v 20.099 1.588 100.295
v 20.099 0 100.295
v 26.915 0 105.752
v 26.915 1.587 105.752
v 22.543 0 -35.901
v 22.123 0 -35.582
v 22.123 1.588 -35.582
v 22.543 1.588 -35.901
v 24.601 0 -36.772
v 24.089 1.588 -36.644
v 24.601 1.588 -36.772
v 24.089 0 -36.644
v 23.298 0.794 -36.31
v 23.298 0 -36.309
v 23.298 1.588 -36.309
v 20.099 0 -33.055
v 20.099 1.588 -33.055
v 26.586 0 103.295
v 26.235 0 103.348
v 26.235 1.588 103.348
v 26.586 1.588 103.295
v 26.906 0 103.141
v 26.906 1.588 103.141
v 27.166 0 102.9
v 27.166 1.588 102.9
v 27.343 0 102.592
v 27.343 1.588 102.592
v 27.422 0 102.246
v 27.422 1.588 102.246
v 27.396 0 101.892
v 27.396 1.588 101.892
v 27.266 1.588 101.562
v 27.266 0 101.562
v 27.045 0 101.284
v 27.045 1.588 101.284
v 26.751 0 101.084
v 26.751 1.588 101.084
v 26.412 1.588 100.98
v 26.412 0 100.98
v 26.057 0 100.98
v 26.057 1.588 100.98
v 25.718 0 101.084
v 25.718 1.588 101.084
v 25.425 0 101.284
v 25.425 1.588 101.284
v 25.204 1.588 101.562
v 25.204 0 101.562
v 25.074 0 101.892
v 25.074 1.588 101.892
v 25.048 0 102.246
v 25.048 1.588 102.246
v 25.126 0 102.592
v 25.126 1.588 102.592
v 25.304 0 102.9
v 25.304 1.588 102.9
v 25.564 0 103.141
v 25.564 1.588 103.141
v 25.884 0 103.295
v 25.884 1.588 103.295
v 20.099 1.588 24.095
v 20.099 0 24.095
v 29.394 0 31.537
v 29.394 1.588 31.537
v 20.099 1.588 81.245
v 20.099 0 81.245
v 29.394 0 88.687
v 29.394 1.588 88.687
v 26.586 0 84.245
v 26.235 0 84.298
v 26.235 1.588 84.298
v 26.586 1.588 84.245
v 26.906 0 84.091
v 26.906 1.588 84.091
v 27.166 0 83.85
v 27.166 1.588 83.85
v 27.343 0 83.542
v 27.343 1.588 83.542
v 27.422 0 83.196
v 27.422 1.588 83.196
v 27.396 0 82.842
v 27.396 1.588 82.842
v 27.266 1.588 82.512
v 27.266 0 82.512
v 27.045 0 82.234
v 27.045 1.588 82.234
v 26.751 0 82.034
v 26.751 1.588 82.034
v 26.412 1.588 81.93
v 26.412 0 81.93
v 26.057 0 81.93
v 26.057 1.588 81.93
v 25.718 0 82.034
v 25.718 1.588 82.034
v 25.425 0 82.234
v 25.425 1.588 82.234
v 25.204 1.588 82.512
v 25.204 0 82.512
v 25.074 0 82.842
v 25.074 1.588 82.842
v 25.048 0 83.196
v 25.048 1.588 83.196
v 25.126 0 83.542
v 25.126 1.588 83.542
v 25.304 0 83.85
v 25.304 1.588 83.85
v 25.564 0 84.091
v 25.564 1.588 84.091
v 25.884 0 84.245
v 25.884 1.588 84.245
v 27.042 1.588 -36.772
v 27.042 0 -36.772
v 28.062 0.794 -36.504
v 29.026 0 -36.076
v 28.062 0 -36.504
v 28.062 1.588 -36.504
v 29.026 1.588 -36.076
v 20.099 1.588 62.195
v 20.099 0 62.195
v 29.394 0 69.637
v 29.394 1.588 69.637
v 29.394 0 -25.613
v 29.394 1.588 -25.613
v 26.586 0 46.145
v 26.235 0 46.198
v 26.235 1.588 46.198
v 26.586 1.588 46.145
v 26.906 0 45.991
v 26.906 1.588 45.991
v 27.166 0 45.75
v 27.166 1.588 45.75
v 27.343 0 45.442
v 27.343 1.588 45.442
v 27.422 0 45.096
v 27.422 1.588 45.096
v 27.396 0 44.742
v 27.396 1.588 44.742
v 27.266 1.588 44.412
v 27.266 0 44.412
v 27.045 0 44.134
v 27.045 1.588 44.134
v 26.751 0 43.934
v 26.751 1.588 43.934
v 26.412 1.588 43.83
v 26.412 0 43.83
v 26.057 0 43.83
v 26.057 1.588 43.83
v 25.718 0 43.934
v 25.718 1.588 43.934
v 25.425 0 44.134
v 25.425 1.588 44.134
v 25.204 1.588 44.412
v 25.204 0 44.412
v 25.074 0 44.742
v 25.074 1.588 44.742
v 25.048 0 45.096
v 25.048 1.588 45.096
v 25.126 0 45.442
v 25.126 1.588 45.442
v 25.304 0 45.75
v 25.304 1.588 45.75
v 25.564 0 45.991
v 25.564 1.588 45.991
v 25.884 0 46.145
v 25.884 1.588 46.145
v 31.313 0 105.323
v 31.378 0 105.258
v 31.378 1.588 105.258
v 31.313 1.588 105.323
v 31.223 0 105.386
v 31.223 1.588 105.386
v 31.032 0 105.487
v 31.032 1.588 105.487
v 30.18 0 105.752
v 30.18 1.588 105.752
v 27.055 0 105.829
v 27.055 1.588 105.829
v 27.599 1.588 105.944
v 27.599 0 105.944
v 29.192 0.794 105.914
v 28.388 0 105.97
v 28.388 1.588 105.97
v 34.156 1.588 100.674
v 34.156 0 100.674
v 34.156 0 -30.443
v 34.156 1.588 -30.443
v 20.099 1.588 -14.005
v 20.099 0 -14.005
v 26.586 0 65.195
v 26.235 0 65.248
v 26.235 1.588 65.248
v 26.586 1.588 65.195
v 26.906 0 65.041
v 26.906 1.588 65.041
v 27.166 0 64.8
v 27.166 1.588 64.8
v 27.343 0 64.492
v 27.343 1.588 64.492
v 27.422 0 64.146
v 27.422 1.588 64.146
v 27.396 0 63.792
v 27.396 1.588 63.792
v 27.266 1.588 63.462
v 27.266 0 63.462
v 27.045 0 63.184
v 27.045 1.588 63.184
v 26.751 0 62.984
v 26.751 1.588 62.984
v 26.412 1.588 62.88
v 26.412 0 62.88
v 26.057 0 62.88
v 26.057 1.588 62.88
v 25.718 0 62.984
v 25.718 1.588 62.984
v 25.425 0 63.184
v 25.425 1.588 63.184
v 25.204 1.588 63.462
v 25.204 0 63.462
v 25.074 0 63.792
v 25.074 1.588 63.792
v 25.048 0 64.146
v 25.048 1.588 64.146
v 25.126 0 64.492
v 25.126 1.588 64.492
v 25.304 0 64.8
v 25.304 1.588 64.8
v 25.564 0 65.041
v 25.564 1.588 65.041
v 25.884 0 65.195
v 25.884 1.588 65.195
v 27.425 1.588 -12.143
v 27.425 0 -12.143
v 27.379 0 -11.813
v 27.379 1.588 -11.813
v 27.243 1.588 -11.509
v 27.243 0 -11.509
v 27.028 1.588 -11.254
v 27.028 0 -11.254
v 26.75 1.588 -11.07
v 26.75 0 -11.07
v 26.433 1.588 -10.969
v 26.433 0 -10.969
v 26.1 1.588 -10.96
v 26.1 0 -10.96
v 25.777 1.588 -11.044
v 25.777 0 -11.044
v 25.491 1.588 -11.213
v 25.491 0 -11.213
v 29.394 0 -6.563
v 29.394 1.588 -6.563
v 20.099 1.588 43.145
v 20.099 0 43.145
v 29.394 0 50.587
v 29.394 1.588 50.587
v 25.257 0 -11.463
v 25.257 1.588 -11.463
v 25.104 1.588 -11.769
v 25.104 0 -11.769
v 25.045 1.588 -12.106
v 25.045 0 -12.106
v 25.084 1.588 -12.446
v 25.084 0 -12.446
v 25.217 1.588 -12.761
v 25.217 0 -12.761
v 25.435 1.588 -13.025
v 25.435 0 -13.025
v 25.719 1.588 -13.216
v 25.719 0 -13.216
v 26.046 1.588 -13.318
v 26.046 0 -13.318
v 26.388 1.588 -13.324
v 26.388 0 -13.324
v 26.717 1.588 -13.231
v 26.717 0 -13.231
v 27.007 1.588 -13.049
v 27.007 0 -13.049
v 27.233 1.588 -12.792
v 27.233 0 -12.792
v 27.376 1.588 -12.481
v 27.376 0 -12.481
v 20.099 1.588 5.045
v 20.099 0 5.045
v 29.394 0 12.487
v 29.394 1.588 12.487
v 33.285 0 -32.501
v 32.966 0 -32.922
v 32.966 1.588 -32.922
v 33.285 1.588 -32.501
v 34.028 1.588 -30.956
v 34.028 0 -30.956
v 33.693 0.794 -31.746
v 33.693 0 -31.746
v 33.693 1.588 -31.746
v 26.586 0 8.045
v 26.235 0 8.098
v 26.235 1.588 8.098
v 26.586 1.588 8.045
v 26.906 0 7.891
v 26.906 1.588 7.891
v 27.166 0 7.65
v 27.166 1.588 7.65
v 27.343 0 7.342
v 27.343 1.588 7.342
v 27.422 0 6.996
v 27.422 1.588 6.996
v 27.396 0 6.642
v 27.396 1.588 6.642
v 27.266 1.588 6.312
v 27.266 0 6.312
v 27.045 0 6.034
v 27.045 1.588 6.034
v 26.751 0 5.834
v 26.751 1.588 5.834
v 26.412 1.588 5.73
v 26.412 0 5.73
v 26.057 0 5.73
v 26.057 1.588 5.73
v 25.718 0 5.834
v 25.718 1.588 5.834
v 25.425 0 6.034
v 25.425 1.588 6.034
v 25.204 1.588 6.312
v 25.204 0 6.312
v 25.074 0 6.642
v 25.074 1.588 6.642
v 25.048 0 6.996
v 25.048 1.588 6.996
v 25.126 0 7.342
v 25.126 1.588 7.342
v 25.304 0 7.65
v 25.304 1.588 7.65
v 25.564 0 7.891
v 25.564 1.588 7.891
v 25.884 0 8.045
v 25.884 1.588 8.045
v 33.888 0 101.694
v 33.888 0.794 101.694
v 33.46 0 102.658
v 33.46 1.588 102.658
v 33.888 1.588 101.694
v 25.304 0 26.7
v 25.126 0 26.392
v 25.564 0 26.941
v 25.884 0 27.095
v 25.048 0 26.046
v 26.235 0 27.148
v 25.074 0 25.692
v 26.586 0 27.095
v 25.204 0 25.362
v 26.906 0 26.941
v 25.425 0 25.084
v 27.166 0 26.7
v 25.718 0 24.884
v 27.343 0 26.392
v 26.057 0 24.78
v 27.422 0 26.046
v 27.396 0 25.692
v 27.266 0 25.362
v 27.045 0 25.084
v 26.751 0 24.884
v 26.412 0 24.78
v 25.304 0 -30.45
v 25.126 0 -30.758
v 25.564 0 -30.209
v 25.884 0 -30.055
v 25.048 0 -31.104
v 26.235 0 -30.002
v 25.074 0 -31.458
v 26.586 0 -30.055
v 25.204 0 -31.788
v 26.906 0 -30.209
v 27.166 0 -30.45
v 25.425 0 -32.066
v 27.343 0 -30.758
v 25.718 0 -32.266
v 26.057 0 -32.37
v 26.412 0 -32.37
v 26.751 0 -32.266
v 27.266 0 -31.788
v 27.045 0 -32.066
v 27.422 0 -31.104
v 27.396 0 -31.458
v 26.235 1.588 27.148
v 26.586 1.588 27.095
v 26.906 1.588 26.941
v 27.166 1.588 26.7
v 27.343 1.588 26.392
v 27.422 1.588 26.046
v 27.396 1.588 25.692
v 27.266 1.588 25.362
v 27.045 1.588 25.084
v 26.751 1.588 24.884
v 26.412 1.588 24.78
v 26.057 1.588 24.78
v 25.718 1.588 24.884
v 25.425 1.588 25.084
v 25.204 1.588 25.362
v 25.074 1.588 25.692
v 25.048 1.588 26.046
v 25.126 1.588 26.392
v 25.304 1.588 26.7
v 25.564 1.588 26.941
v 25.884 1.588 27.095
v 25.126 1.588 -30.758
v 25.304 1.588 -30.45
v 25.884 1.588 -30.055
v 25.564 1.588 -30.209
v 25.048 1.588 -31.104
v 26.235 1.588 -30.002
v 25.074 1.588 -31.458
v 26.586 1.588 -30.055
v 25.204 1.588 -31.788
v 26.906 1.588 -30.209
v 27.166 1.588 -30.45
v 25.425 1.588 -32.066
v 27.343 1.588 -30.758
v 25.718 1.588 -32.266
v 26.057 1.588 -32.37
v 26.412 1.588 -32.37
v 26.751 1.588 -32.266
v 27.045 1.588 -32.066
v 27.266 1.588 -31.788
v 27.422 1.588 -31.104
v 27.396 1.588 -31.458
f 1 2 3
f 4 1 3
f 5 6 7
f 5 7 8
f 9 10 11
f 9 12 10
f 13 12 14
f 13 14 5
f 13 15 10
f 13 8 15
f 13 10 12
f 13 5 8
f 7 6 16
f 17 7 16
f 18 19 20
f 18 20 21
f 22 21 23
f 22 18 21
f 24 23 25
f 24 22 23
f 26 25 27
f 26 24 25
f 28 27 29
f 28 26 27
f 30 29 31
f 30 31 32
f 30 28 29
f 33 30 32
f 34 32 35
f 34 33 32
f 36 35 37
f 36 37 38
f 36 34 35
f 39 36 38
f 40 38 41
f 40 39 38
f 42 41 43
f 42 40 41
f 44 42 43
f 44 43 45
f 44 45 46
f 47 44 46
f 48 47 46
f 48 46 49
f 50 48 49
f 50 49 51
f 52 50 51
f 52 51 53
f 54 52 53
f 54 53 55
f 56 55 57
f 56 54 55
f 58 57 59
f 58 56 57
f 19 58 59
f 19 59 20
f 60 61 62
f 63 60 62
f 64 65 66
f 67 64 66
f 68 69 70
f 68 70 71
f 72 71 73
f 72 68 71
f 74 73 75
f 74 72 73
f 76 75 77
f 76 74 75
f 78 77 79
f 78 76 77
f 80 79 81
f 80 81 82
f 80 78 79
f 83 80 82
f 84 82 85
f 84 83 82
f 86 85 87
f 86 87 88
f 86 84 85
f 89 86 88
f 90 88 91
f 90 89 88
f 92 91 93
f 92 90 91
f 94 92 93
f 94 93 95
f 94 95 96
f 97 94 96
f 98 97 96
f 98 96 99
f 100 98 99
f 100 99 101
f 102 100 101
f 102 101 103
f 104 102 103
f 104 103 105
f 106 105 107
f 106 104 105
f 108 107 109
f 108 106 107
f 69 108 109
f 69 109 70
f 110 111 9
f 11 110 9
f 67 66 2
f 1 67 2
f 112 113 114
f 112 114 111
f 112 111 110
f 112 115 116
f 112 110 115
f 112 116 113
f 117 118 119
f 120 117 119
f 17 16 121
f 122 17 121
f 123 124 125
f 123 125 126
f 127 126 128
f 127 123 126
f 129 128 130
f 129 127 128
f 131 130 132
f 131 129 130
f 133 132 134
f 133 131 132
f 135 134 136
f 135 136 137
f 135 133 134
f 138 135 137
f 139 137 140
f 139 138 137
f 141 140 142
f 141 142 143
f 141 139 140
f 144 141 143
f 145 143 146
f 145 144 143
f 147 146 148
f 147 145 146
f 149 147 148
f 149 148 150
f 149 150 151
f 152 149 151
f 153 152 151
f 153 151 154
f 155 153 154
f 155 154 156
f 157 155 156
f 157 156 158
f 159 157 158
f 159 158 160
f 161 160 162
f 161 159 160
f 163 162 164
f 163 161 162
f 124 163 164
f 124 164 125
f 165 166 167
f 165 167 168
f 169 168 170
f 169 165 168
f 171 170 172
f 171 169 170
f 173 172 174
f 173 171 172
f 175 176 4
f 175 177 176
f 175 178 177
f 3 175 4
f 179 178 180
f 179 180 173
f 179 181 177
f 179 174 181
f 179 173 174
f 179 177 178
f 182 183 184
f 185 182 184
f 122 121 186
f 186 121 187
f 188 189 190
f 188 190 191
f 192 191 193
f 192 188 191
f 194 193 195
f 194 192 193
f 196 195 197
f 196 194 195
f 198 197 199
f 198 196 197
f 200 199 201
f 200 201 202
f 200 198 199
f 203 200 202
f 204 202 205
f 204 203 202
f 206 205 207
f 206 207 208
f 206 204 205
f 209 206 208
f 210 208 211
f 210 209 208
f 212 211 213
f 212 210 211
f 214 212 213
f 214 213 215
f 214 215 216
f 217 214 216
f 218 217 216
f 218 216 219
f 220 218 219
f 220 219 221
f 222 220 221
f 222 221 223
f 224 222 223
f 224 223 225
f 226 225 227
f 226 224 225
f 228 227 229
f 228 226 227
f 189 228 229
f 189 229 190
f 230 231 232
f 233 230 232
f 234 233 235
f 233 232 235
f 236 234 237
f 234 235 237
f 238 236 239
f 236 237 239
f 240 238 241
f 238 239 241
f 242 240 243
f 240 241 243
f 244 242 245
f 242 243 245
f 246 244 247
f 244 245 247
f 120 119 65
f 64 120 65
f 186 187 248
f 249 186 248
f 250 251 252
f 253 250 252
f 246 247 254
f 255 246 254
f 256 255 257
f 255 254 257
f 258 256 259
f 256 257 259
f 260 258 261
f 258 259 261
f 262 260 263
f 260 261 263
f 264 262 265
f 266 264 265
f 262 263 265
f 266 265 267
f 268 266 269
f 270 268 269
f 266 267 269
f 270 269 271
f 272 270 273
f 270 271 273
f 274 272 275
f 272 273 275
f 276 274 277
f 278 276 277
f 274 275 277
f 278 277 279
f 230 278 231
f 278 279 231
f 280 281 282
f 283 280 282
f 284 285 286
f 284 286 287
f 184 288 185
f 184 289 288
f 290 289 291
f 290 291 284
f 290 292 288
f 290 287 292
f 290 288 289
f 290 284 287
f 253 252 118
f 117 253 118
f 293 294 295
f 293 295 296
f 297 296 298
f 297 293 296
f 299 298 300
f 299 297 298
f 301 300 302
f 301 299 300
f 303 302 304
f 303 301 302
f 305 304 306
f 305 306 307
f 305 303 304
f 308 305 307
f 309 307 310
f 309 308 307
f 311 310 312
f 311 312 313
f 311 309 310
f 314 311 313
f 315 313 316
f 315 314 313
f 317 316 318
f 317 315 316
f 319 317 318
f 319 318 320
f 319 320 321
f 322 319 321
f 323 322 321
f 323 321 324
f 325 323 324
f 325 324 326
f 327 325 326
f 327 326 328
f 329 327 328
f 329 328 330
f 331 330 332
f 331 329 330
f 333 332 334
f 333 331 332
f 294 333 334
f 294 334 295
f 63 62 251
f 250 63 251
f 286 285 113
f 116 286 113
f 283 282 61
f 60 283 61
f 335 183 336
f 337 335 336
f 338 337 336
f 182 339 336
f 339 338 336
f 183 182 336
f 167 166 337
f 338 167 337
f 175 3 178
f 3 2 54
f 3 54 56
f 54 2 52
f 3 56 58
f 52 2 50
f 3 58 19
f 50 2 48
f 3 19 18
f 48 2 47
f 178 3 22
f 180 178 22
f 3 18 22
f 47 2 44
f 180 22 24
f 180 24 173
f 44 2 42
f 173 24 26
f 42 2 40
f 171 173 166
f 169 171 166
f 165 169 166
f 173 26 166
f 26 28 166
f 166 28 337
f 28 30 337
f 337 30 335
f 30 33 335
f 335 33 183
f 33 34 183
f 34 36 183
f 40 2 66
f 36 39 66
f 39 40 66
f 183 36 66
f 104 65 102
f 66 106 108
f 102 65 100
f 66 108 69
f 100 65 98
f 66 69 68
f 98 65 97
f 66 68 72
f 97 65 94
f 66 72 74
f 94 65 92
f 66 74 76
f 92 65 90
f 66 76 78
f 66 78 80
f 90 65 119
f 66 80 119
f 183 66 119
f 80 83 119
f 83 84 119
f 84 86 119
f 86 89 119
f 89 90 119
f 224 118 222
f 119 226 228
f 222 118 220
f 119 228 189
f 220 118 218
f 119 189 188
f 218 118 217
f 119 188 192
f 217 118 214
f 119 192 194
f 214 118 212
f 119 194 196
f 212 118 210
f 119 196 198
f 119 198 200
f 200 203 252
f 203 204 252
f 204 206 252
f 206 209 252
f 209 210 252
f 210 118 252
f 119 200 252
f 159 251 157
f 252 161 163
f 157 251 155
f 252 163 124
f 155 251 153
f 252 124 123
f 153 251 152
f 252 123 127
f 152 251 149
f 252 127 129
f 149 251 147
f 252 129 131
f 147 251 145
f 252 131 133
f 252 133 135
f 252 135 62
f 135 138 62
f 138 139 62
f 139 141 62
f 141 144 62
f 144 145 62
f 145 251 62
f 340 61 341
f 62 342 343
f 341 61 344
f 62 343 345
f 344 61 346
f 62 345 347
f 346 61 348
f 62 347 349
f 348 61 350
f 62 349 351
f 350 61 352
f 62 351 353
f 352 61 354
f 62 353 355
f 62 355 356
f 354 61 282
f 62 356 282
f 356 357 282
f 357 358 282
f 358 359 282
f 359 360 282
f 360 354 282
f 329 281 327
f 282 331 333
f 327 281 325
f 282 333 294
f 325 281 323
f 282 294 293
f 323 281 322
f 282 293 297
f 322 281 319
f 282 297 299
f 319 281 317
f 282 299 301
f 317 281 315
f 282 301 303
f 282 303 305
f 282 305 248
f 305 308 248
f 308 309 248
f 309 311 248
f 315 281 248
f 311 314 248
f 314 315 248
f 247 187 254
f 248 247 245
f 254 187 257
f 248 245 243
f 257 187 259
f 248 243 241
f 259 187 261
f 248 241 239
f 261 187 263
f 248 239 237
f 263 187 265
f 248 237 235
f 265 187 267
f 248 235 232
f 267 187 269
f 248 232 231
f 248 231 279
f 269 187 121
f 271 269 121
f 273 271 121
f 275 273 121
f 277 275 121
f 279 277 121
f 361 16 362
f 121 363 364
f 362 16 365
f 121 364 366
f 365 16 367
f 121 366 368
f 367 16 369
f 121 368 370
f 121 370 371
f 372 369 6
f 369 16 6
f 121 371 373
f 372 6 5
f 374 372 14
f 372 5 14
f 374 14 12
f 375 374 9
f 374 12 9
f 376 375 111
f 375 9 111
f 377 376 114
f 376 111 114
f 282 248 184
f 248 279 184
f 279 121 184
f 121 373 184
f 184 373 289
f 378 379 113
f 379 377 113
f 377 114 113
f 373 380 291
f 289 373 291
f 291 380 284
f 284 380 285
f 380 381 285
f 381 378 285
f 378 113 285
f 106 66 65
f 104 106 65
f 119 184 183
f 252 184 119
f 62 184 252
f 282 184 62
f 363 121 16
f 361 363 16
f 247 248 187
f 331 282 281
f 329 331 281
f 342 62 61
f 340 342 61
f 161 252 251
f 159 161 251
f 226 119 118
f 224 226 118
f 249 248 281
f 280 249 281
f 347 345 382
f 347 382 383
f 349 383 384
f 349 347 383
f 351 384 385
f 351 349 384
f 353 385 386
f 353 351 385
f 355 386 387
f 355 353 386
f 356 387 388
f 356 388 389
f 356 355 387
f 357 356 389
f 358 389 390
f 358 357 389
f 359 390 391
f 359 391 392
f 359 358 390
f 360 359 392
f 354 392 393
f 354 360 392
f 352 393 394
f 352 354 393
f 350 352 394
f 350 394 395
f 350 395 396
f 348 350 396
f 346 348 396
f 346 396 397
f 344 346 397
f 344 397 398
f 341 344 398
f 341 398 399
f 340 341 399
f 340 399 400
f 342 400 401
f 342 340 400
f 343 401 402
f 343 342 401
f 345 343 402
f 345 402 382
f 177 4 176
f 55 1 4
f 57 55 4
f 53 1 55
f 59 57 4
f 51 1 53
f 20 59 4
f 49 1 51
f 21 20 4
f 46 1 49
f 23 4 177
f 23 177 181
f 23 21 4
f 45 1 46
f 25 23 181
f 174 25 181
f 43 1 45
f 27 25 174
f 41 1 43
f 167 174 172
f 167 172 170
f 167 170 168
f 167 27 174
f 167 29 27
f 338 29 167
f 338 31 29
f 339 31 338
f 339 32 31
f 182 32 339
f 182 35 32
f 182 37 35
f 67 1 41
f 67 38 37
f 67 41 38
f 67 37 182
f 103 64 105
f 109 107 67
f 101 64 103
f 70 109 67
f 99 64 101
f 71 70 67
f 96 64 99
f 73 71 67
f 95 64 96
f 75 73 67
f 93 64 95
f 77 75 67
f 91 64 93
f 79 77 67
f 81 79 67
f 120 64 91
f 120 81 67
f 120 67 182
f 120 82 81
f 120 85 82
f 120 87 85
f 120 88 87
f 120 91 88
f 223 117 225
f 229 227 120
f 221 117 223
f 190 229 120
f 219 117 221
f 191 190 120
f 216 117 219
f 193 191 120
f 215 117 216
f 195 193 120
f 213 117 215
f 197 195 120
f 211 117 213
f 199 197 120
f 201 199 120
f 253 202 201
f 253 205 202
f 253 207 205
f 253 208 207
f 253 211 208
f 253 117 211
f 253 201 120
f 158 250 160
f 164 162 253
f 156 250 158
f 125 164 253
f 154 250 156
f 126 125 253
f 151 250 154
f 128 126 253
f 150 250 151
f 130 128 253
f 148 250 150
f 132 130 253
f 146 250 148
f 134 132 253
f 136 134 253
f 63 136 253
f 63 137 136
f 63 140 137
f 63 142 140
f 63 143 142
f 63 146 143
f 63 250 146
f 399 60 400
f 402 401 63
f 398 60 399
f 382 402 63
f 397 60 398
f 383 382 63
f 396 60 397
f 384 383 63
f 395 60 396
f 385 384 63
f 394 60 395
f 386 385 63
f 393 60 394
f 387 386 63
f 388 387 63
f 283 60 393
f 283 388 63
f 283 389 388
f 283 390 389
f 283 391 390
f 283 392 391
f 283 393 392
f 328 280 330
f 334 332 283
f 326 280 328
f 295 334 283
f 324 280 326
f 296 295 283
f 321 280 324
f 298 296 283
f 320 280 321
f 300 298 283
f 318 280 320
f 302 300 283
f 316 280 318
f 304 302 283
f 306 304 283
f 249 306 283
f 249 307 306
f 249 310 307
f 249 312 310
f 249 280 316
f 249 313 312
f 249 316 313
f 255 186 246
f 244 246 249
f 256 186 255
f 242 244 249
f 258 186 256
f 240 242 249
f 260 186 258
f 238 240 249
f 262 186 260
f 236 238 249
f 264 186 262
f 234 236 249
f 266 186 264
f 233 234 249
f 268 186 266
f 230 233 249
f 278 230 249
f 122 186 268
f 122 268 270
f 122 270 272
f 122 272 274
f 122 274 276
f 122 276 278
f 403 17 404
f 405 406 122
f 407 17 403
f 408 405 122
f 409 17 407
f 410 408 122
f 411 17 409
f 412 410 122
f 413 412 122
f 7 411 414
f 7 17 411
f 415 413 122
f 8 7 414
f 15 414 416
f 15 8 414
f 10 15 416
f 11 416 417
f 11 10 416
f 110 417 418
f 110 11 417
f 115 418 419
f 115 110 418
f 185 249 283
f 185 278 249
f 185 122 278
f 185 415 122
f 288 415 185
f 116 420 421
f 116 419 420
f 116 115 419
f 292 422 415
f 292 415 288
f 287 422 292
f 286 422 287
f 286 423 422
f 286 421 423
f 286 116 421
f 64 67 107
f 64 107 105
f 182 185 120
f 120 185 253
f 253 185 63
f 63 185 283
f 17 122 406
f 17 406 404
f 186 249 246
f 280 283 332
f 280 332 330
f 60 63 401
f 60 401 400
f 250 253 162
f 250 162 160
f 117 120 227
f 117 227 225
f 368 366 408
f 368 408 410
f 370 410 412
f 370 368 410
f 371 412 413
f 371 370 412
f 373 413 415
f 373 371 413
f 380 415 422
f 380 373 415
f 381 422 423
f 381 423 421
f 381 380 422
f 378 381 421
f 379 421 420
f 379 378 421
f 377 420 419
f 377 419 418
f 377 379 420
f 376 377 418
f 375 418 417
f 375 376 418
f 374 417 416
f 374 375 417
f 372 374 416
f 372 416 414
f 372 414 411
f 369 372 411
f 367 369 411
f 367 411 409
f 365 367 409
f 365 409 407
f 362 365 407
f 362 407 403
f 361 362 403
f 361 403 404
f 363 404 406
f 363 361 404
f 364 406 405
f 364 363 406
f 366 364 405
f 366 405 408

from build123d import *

# Parameters (mm, degrees)
SKETCH2_R           = 1.190625
BOSS_EXTRUDE1_DEPTH = 1.5875
FILLET1_SIZE        = 3.175


with BuildPart() as part:
    # Sketch2 → Boss-Extrude1 (new body)
    with BuildSketch(Plane(origin=(0, 0, 0), x_dir=(1, 0, 0), z_dir=(0, 1, 0))):
        Polygon((29.393690453, -107.736776908), (34.156190453, -101.788416314), (34.156190453, 31.968309197), (28.155939525, 36.772354713), (23.075939525, 36.772354713), (20.099377025, 33.054629342), (29.393690453, 25.613223092), (20.099377025, 14.004629342), (24.746533739, 10.283926217), (29.393690453, 6.563223092), (20.099377025, -5.045370658), (29.393690453, -12.486776908), (20.099377025, -24.095370658), (29.393690453, -31.536776908), (20.099377025, -43.145370658), (29.393690453, -50.586776908), (20.099377025, -62.195370658), (29.393690453, -69.636776908), (20.099377025, -81.245370658), (29.393690453, -88.686776908), (20.099377025, -100.295370658), align=None)
        with Locations(Location((26.234814989, -102.157211097, 0), (0, 0, 270))):
            Circle(SKETCH2_R, mode=Mode.SUBTRACT)
        with Locations(Location((26.234814989, -83.107211097, 0), (0, 0, 270))):
            Circle(SKETCH2_R, mode=Mode.SUBTRACT)
        with Locations(Location((26.234814989, -64.057211097, 0), (0, 0, 270))):
            Circle(SKETCH2_R, mode=Mode.SUBTRACT)
        with Locations(Location((26.234814989, -45.007211097, 0), (0, 0, 270))):
            Circle(SKETCH2_R, mode=Mode.SUBTRACT)
        with Locations(Location((26.234814989, -25.957211097, 0), (0, 0, 270))):
            Circle(SKETCH2_R, mode=Mode.SUBTRACT)
        with Locations(Location((26.234814989, -6.907211097, 0), (0, 0, 270))):
            Circle(SKETCH2_R, mode=Mode.SUBTRACT)
        with BuildLine():
            ThreePointArc((27.425439989, 12.142788903), (26.750370737, 11.069574031), (25.490674364, 11.21335756))
            ThreePointArc((25.490674364, 11.21335756), (25.719259241, 13.216003775), (27.425439989, 12.142788903))
        make_face(mode=Mode.SUBTRACT)
        with Locations(Location((26.234814989, 31.192788903, 0), (0, 0, 270))):
            Circle(SKETCH2_R, mode=Mode.SUBTRACT)
    extrude(amount=BOSS_EXTRUDE1_DEPTH)

    # Fillet1
    # a fillet whose section is not a circle: 3.175 mm, written as the material it takes off along each edge
    with BuildSketch(Plane(origin=(29.393690453, -7.9375, 107.736776908), x_dir=(0.6249999999921612, 0, -0.7806247498060759), z_dir=(0, 1, 0))) as fillet1_piece_1:
        with BuildLine():
            Bezier((FILLET1_SIZE, 0), (0, 0), (0, FILLET1_SIZE), weights=[1, 0.224506403, 1])
            Line((0, FILLET1_SIZE), (0, 0))
            Line((0, 0), (FILLET1_SIZE, 0))
        make_face()
    extrude(amount=17.4625, mode=Mode.SUBTRACT)
    with BuildSketch(Plane(origin=(34.156190453, -2.786065678, 101.788416314), x_dir=(-0.6250000000189532, 0, 0.7806247497846253), z_dir=(0, 1, 0))) as fillet1_piece_2:
        with BuildLine():
            Bezier((1.114426271, 0), (0, 0), (-0.869948729, -0.696516419), weights=[1, 0.299581461, 1])
            Line((-0.869948729, -0.696516419), (0, 0))
            Line((0, 0), (1.114426271, 0))
        make_face()
    extrude(amount=7.159631356, mode=Mode.SUBTRACT)
    with BuildSketch(Plane(origin=(34.156190453, -3.813051663, -31.968309197), x_dir=(-0.7806247498123451, 0, -0.624999999984331), z_dir=(0, 1, 0)), Plane(origin=(23.075939525, -3.813051662, -36.772354713), x_dir=(-0.6250000000000002, 0, 0.7806247497997996), z_dir=(0, 1, 0))) as fillet1_piece_3:
        with BuildLine():
            Bezier((1.525220665, 0), (0, 0), (-0.953262916, 1.190625), weights=[1, 0.286190632, 1])
            Line((-0.953262916, 1.190625), (0, 0))
            Line((0, 0), (1.525220665, 0))
        make_face()
    extrude(amount=9.213603325, mode=Mode.SUBTRACT)
    with BuildSketch(Plane(origin=(28.155939525, -2.786065678, -36.772354713), x_dir=(-1, 0, 0), z_dir=(0, 1, 0))) as fillet1_piece_4:
        with BuildLine():
            Bezier((1.114426271, 0), (0, 0), (-0.869948729, 0.696516419), weights=[1, 0.299581461, 1])
            Line((-0.869948729, 0.696516419), (0, 0))
            Line((0, 0), (1.114426271, 0))
        make_face()
    extrude(amount=7.159631355, mode=Mode.SUBTRACT)


solid = part.part
